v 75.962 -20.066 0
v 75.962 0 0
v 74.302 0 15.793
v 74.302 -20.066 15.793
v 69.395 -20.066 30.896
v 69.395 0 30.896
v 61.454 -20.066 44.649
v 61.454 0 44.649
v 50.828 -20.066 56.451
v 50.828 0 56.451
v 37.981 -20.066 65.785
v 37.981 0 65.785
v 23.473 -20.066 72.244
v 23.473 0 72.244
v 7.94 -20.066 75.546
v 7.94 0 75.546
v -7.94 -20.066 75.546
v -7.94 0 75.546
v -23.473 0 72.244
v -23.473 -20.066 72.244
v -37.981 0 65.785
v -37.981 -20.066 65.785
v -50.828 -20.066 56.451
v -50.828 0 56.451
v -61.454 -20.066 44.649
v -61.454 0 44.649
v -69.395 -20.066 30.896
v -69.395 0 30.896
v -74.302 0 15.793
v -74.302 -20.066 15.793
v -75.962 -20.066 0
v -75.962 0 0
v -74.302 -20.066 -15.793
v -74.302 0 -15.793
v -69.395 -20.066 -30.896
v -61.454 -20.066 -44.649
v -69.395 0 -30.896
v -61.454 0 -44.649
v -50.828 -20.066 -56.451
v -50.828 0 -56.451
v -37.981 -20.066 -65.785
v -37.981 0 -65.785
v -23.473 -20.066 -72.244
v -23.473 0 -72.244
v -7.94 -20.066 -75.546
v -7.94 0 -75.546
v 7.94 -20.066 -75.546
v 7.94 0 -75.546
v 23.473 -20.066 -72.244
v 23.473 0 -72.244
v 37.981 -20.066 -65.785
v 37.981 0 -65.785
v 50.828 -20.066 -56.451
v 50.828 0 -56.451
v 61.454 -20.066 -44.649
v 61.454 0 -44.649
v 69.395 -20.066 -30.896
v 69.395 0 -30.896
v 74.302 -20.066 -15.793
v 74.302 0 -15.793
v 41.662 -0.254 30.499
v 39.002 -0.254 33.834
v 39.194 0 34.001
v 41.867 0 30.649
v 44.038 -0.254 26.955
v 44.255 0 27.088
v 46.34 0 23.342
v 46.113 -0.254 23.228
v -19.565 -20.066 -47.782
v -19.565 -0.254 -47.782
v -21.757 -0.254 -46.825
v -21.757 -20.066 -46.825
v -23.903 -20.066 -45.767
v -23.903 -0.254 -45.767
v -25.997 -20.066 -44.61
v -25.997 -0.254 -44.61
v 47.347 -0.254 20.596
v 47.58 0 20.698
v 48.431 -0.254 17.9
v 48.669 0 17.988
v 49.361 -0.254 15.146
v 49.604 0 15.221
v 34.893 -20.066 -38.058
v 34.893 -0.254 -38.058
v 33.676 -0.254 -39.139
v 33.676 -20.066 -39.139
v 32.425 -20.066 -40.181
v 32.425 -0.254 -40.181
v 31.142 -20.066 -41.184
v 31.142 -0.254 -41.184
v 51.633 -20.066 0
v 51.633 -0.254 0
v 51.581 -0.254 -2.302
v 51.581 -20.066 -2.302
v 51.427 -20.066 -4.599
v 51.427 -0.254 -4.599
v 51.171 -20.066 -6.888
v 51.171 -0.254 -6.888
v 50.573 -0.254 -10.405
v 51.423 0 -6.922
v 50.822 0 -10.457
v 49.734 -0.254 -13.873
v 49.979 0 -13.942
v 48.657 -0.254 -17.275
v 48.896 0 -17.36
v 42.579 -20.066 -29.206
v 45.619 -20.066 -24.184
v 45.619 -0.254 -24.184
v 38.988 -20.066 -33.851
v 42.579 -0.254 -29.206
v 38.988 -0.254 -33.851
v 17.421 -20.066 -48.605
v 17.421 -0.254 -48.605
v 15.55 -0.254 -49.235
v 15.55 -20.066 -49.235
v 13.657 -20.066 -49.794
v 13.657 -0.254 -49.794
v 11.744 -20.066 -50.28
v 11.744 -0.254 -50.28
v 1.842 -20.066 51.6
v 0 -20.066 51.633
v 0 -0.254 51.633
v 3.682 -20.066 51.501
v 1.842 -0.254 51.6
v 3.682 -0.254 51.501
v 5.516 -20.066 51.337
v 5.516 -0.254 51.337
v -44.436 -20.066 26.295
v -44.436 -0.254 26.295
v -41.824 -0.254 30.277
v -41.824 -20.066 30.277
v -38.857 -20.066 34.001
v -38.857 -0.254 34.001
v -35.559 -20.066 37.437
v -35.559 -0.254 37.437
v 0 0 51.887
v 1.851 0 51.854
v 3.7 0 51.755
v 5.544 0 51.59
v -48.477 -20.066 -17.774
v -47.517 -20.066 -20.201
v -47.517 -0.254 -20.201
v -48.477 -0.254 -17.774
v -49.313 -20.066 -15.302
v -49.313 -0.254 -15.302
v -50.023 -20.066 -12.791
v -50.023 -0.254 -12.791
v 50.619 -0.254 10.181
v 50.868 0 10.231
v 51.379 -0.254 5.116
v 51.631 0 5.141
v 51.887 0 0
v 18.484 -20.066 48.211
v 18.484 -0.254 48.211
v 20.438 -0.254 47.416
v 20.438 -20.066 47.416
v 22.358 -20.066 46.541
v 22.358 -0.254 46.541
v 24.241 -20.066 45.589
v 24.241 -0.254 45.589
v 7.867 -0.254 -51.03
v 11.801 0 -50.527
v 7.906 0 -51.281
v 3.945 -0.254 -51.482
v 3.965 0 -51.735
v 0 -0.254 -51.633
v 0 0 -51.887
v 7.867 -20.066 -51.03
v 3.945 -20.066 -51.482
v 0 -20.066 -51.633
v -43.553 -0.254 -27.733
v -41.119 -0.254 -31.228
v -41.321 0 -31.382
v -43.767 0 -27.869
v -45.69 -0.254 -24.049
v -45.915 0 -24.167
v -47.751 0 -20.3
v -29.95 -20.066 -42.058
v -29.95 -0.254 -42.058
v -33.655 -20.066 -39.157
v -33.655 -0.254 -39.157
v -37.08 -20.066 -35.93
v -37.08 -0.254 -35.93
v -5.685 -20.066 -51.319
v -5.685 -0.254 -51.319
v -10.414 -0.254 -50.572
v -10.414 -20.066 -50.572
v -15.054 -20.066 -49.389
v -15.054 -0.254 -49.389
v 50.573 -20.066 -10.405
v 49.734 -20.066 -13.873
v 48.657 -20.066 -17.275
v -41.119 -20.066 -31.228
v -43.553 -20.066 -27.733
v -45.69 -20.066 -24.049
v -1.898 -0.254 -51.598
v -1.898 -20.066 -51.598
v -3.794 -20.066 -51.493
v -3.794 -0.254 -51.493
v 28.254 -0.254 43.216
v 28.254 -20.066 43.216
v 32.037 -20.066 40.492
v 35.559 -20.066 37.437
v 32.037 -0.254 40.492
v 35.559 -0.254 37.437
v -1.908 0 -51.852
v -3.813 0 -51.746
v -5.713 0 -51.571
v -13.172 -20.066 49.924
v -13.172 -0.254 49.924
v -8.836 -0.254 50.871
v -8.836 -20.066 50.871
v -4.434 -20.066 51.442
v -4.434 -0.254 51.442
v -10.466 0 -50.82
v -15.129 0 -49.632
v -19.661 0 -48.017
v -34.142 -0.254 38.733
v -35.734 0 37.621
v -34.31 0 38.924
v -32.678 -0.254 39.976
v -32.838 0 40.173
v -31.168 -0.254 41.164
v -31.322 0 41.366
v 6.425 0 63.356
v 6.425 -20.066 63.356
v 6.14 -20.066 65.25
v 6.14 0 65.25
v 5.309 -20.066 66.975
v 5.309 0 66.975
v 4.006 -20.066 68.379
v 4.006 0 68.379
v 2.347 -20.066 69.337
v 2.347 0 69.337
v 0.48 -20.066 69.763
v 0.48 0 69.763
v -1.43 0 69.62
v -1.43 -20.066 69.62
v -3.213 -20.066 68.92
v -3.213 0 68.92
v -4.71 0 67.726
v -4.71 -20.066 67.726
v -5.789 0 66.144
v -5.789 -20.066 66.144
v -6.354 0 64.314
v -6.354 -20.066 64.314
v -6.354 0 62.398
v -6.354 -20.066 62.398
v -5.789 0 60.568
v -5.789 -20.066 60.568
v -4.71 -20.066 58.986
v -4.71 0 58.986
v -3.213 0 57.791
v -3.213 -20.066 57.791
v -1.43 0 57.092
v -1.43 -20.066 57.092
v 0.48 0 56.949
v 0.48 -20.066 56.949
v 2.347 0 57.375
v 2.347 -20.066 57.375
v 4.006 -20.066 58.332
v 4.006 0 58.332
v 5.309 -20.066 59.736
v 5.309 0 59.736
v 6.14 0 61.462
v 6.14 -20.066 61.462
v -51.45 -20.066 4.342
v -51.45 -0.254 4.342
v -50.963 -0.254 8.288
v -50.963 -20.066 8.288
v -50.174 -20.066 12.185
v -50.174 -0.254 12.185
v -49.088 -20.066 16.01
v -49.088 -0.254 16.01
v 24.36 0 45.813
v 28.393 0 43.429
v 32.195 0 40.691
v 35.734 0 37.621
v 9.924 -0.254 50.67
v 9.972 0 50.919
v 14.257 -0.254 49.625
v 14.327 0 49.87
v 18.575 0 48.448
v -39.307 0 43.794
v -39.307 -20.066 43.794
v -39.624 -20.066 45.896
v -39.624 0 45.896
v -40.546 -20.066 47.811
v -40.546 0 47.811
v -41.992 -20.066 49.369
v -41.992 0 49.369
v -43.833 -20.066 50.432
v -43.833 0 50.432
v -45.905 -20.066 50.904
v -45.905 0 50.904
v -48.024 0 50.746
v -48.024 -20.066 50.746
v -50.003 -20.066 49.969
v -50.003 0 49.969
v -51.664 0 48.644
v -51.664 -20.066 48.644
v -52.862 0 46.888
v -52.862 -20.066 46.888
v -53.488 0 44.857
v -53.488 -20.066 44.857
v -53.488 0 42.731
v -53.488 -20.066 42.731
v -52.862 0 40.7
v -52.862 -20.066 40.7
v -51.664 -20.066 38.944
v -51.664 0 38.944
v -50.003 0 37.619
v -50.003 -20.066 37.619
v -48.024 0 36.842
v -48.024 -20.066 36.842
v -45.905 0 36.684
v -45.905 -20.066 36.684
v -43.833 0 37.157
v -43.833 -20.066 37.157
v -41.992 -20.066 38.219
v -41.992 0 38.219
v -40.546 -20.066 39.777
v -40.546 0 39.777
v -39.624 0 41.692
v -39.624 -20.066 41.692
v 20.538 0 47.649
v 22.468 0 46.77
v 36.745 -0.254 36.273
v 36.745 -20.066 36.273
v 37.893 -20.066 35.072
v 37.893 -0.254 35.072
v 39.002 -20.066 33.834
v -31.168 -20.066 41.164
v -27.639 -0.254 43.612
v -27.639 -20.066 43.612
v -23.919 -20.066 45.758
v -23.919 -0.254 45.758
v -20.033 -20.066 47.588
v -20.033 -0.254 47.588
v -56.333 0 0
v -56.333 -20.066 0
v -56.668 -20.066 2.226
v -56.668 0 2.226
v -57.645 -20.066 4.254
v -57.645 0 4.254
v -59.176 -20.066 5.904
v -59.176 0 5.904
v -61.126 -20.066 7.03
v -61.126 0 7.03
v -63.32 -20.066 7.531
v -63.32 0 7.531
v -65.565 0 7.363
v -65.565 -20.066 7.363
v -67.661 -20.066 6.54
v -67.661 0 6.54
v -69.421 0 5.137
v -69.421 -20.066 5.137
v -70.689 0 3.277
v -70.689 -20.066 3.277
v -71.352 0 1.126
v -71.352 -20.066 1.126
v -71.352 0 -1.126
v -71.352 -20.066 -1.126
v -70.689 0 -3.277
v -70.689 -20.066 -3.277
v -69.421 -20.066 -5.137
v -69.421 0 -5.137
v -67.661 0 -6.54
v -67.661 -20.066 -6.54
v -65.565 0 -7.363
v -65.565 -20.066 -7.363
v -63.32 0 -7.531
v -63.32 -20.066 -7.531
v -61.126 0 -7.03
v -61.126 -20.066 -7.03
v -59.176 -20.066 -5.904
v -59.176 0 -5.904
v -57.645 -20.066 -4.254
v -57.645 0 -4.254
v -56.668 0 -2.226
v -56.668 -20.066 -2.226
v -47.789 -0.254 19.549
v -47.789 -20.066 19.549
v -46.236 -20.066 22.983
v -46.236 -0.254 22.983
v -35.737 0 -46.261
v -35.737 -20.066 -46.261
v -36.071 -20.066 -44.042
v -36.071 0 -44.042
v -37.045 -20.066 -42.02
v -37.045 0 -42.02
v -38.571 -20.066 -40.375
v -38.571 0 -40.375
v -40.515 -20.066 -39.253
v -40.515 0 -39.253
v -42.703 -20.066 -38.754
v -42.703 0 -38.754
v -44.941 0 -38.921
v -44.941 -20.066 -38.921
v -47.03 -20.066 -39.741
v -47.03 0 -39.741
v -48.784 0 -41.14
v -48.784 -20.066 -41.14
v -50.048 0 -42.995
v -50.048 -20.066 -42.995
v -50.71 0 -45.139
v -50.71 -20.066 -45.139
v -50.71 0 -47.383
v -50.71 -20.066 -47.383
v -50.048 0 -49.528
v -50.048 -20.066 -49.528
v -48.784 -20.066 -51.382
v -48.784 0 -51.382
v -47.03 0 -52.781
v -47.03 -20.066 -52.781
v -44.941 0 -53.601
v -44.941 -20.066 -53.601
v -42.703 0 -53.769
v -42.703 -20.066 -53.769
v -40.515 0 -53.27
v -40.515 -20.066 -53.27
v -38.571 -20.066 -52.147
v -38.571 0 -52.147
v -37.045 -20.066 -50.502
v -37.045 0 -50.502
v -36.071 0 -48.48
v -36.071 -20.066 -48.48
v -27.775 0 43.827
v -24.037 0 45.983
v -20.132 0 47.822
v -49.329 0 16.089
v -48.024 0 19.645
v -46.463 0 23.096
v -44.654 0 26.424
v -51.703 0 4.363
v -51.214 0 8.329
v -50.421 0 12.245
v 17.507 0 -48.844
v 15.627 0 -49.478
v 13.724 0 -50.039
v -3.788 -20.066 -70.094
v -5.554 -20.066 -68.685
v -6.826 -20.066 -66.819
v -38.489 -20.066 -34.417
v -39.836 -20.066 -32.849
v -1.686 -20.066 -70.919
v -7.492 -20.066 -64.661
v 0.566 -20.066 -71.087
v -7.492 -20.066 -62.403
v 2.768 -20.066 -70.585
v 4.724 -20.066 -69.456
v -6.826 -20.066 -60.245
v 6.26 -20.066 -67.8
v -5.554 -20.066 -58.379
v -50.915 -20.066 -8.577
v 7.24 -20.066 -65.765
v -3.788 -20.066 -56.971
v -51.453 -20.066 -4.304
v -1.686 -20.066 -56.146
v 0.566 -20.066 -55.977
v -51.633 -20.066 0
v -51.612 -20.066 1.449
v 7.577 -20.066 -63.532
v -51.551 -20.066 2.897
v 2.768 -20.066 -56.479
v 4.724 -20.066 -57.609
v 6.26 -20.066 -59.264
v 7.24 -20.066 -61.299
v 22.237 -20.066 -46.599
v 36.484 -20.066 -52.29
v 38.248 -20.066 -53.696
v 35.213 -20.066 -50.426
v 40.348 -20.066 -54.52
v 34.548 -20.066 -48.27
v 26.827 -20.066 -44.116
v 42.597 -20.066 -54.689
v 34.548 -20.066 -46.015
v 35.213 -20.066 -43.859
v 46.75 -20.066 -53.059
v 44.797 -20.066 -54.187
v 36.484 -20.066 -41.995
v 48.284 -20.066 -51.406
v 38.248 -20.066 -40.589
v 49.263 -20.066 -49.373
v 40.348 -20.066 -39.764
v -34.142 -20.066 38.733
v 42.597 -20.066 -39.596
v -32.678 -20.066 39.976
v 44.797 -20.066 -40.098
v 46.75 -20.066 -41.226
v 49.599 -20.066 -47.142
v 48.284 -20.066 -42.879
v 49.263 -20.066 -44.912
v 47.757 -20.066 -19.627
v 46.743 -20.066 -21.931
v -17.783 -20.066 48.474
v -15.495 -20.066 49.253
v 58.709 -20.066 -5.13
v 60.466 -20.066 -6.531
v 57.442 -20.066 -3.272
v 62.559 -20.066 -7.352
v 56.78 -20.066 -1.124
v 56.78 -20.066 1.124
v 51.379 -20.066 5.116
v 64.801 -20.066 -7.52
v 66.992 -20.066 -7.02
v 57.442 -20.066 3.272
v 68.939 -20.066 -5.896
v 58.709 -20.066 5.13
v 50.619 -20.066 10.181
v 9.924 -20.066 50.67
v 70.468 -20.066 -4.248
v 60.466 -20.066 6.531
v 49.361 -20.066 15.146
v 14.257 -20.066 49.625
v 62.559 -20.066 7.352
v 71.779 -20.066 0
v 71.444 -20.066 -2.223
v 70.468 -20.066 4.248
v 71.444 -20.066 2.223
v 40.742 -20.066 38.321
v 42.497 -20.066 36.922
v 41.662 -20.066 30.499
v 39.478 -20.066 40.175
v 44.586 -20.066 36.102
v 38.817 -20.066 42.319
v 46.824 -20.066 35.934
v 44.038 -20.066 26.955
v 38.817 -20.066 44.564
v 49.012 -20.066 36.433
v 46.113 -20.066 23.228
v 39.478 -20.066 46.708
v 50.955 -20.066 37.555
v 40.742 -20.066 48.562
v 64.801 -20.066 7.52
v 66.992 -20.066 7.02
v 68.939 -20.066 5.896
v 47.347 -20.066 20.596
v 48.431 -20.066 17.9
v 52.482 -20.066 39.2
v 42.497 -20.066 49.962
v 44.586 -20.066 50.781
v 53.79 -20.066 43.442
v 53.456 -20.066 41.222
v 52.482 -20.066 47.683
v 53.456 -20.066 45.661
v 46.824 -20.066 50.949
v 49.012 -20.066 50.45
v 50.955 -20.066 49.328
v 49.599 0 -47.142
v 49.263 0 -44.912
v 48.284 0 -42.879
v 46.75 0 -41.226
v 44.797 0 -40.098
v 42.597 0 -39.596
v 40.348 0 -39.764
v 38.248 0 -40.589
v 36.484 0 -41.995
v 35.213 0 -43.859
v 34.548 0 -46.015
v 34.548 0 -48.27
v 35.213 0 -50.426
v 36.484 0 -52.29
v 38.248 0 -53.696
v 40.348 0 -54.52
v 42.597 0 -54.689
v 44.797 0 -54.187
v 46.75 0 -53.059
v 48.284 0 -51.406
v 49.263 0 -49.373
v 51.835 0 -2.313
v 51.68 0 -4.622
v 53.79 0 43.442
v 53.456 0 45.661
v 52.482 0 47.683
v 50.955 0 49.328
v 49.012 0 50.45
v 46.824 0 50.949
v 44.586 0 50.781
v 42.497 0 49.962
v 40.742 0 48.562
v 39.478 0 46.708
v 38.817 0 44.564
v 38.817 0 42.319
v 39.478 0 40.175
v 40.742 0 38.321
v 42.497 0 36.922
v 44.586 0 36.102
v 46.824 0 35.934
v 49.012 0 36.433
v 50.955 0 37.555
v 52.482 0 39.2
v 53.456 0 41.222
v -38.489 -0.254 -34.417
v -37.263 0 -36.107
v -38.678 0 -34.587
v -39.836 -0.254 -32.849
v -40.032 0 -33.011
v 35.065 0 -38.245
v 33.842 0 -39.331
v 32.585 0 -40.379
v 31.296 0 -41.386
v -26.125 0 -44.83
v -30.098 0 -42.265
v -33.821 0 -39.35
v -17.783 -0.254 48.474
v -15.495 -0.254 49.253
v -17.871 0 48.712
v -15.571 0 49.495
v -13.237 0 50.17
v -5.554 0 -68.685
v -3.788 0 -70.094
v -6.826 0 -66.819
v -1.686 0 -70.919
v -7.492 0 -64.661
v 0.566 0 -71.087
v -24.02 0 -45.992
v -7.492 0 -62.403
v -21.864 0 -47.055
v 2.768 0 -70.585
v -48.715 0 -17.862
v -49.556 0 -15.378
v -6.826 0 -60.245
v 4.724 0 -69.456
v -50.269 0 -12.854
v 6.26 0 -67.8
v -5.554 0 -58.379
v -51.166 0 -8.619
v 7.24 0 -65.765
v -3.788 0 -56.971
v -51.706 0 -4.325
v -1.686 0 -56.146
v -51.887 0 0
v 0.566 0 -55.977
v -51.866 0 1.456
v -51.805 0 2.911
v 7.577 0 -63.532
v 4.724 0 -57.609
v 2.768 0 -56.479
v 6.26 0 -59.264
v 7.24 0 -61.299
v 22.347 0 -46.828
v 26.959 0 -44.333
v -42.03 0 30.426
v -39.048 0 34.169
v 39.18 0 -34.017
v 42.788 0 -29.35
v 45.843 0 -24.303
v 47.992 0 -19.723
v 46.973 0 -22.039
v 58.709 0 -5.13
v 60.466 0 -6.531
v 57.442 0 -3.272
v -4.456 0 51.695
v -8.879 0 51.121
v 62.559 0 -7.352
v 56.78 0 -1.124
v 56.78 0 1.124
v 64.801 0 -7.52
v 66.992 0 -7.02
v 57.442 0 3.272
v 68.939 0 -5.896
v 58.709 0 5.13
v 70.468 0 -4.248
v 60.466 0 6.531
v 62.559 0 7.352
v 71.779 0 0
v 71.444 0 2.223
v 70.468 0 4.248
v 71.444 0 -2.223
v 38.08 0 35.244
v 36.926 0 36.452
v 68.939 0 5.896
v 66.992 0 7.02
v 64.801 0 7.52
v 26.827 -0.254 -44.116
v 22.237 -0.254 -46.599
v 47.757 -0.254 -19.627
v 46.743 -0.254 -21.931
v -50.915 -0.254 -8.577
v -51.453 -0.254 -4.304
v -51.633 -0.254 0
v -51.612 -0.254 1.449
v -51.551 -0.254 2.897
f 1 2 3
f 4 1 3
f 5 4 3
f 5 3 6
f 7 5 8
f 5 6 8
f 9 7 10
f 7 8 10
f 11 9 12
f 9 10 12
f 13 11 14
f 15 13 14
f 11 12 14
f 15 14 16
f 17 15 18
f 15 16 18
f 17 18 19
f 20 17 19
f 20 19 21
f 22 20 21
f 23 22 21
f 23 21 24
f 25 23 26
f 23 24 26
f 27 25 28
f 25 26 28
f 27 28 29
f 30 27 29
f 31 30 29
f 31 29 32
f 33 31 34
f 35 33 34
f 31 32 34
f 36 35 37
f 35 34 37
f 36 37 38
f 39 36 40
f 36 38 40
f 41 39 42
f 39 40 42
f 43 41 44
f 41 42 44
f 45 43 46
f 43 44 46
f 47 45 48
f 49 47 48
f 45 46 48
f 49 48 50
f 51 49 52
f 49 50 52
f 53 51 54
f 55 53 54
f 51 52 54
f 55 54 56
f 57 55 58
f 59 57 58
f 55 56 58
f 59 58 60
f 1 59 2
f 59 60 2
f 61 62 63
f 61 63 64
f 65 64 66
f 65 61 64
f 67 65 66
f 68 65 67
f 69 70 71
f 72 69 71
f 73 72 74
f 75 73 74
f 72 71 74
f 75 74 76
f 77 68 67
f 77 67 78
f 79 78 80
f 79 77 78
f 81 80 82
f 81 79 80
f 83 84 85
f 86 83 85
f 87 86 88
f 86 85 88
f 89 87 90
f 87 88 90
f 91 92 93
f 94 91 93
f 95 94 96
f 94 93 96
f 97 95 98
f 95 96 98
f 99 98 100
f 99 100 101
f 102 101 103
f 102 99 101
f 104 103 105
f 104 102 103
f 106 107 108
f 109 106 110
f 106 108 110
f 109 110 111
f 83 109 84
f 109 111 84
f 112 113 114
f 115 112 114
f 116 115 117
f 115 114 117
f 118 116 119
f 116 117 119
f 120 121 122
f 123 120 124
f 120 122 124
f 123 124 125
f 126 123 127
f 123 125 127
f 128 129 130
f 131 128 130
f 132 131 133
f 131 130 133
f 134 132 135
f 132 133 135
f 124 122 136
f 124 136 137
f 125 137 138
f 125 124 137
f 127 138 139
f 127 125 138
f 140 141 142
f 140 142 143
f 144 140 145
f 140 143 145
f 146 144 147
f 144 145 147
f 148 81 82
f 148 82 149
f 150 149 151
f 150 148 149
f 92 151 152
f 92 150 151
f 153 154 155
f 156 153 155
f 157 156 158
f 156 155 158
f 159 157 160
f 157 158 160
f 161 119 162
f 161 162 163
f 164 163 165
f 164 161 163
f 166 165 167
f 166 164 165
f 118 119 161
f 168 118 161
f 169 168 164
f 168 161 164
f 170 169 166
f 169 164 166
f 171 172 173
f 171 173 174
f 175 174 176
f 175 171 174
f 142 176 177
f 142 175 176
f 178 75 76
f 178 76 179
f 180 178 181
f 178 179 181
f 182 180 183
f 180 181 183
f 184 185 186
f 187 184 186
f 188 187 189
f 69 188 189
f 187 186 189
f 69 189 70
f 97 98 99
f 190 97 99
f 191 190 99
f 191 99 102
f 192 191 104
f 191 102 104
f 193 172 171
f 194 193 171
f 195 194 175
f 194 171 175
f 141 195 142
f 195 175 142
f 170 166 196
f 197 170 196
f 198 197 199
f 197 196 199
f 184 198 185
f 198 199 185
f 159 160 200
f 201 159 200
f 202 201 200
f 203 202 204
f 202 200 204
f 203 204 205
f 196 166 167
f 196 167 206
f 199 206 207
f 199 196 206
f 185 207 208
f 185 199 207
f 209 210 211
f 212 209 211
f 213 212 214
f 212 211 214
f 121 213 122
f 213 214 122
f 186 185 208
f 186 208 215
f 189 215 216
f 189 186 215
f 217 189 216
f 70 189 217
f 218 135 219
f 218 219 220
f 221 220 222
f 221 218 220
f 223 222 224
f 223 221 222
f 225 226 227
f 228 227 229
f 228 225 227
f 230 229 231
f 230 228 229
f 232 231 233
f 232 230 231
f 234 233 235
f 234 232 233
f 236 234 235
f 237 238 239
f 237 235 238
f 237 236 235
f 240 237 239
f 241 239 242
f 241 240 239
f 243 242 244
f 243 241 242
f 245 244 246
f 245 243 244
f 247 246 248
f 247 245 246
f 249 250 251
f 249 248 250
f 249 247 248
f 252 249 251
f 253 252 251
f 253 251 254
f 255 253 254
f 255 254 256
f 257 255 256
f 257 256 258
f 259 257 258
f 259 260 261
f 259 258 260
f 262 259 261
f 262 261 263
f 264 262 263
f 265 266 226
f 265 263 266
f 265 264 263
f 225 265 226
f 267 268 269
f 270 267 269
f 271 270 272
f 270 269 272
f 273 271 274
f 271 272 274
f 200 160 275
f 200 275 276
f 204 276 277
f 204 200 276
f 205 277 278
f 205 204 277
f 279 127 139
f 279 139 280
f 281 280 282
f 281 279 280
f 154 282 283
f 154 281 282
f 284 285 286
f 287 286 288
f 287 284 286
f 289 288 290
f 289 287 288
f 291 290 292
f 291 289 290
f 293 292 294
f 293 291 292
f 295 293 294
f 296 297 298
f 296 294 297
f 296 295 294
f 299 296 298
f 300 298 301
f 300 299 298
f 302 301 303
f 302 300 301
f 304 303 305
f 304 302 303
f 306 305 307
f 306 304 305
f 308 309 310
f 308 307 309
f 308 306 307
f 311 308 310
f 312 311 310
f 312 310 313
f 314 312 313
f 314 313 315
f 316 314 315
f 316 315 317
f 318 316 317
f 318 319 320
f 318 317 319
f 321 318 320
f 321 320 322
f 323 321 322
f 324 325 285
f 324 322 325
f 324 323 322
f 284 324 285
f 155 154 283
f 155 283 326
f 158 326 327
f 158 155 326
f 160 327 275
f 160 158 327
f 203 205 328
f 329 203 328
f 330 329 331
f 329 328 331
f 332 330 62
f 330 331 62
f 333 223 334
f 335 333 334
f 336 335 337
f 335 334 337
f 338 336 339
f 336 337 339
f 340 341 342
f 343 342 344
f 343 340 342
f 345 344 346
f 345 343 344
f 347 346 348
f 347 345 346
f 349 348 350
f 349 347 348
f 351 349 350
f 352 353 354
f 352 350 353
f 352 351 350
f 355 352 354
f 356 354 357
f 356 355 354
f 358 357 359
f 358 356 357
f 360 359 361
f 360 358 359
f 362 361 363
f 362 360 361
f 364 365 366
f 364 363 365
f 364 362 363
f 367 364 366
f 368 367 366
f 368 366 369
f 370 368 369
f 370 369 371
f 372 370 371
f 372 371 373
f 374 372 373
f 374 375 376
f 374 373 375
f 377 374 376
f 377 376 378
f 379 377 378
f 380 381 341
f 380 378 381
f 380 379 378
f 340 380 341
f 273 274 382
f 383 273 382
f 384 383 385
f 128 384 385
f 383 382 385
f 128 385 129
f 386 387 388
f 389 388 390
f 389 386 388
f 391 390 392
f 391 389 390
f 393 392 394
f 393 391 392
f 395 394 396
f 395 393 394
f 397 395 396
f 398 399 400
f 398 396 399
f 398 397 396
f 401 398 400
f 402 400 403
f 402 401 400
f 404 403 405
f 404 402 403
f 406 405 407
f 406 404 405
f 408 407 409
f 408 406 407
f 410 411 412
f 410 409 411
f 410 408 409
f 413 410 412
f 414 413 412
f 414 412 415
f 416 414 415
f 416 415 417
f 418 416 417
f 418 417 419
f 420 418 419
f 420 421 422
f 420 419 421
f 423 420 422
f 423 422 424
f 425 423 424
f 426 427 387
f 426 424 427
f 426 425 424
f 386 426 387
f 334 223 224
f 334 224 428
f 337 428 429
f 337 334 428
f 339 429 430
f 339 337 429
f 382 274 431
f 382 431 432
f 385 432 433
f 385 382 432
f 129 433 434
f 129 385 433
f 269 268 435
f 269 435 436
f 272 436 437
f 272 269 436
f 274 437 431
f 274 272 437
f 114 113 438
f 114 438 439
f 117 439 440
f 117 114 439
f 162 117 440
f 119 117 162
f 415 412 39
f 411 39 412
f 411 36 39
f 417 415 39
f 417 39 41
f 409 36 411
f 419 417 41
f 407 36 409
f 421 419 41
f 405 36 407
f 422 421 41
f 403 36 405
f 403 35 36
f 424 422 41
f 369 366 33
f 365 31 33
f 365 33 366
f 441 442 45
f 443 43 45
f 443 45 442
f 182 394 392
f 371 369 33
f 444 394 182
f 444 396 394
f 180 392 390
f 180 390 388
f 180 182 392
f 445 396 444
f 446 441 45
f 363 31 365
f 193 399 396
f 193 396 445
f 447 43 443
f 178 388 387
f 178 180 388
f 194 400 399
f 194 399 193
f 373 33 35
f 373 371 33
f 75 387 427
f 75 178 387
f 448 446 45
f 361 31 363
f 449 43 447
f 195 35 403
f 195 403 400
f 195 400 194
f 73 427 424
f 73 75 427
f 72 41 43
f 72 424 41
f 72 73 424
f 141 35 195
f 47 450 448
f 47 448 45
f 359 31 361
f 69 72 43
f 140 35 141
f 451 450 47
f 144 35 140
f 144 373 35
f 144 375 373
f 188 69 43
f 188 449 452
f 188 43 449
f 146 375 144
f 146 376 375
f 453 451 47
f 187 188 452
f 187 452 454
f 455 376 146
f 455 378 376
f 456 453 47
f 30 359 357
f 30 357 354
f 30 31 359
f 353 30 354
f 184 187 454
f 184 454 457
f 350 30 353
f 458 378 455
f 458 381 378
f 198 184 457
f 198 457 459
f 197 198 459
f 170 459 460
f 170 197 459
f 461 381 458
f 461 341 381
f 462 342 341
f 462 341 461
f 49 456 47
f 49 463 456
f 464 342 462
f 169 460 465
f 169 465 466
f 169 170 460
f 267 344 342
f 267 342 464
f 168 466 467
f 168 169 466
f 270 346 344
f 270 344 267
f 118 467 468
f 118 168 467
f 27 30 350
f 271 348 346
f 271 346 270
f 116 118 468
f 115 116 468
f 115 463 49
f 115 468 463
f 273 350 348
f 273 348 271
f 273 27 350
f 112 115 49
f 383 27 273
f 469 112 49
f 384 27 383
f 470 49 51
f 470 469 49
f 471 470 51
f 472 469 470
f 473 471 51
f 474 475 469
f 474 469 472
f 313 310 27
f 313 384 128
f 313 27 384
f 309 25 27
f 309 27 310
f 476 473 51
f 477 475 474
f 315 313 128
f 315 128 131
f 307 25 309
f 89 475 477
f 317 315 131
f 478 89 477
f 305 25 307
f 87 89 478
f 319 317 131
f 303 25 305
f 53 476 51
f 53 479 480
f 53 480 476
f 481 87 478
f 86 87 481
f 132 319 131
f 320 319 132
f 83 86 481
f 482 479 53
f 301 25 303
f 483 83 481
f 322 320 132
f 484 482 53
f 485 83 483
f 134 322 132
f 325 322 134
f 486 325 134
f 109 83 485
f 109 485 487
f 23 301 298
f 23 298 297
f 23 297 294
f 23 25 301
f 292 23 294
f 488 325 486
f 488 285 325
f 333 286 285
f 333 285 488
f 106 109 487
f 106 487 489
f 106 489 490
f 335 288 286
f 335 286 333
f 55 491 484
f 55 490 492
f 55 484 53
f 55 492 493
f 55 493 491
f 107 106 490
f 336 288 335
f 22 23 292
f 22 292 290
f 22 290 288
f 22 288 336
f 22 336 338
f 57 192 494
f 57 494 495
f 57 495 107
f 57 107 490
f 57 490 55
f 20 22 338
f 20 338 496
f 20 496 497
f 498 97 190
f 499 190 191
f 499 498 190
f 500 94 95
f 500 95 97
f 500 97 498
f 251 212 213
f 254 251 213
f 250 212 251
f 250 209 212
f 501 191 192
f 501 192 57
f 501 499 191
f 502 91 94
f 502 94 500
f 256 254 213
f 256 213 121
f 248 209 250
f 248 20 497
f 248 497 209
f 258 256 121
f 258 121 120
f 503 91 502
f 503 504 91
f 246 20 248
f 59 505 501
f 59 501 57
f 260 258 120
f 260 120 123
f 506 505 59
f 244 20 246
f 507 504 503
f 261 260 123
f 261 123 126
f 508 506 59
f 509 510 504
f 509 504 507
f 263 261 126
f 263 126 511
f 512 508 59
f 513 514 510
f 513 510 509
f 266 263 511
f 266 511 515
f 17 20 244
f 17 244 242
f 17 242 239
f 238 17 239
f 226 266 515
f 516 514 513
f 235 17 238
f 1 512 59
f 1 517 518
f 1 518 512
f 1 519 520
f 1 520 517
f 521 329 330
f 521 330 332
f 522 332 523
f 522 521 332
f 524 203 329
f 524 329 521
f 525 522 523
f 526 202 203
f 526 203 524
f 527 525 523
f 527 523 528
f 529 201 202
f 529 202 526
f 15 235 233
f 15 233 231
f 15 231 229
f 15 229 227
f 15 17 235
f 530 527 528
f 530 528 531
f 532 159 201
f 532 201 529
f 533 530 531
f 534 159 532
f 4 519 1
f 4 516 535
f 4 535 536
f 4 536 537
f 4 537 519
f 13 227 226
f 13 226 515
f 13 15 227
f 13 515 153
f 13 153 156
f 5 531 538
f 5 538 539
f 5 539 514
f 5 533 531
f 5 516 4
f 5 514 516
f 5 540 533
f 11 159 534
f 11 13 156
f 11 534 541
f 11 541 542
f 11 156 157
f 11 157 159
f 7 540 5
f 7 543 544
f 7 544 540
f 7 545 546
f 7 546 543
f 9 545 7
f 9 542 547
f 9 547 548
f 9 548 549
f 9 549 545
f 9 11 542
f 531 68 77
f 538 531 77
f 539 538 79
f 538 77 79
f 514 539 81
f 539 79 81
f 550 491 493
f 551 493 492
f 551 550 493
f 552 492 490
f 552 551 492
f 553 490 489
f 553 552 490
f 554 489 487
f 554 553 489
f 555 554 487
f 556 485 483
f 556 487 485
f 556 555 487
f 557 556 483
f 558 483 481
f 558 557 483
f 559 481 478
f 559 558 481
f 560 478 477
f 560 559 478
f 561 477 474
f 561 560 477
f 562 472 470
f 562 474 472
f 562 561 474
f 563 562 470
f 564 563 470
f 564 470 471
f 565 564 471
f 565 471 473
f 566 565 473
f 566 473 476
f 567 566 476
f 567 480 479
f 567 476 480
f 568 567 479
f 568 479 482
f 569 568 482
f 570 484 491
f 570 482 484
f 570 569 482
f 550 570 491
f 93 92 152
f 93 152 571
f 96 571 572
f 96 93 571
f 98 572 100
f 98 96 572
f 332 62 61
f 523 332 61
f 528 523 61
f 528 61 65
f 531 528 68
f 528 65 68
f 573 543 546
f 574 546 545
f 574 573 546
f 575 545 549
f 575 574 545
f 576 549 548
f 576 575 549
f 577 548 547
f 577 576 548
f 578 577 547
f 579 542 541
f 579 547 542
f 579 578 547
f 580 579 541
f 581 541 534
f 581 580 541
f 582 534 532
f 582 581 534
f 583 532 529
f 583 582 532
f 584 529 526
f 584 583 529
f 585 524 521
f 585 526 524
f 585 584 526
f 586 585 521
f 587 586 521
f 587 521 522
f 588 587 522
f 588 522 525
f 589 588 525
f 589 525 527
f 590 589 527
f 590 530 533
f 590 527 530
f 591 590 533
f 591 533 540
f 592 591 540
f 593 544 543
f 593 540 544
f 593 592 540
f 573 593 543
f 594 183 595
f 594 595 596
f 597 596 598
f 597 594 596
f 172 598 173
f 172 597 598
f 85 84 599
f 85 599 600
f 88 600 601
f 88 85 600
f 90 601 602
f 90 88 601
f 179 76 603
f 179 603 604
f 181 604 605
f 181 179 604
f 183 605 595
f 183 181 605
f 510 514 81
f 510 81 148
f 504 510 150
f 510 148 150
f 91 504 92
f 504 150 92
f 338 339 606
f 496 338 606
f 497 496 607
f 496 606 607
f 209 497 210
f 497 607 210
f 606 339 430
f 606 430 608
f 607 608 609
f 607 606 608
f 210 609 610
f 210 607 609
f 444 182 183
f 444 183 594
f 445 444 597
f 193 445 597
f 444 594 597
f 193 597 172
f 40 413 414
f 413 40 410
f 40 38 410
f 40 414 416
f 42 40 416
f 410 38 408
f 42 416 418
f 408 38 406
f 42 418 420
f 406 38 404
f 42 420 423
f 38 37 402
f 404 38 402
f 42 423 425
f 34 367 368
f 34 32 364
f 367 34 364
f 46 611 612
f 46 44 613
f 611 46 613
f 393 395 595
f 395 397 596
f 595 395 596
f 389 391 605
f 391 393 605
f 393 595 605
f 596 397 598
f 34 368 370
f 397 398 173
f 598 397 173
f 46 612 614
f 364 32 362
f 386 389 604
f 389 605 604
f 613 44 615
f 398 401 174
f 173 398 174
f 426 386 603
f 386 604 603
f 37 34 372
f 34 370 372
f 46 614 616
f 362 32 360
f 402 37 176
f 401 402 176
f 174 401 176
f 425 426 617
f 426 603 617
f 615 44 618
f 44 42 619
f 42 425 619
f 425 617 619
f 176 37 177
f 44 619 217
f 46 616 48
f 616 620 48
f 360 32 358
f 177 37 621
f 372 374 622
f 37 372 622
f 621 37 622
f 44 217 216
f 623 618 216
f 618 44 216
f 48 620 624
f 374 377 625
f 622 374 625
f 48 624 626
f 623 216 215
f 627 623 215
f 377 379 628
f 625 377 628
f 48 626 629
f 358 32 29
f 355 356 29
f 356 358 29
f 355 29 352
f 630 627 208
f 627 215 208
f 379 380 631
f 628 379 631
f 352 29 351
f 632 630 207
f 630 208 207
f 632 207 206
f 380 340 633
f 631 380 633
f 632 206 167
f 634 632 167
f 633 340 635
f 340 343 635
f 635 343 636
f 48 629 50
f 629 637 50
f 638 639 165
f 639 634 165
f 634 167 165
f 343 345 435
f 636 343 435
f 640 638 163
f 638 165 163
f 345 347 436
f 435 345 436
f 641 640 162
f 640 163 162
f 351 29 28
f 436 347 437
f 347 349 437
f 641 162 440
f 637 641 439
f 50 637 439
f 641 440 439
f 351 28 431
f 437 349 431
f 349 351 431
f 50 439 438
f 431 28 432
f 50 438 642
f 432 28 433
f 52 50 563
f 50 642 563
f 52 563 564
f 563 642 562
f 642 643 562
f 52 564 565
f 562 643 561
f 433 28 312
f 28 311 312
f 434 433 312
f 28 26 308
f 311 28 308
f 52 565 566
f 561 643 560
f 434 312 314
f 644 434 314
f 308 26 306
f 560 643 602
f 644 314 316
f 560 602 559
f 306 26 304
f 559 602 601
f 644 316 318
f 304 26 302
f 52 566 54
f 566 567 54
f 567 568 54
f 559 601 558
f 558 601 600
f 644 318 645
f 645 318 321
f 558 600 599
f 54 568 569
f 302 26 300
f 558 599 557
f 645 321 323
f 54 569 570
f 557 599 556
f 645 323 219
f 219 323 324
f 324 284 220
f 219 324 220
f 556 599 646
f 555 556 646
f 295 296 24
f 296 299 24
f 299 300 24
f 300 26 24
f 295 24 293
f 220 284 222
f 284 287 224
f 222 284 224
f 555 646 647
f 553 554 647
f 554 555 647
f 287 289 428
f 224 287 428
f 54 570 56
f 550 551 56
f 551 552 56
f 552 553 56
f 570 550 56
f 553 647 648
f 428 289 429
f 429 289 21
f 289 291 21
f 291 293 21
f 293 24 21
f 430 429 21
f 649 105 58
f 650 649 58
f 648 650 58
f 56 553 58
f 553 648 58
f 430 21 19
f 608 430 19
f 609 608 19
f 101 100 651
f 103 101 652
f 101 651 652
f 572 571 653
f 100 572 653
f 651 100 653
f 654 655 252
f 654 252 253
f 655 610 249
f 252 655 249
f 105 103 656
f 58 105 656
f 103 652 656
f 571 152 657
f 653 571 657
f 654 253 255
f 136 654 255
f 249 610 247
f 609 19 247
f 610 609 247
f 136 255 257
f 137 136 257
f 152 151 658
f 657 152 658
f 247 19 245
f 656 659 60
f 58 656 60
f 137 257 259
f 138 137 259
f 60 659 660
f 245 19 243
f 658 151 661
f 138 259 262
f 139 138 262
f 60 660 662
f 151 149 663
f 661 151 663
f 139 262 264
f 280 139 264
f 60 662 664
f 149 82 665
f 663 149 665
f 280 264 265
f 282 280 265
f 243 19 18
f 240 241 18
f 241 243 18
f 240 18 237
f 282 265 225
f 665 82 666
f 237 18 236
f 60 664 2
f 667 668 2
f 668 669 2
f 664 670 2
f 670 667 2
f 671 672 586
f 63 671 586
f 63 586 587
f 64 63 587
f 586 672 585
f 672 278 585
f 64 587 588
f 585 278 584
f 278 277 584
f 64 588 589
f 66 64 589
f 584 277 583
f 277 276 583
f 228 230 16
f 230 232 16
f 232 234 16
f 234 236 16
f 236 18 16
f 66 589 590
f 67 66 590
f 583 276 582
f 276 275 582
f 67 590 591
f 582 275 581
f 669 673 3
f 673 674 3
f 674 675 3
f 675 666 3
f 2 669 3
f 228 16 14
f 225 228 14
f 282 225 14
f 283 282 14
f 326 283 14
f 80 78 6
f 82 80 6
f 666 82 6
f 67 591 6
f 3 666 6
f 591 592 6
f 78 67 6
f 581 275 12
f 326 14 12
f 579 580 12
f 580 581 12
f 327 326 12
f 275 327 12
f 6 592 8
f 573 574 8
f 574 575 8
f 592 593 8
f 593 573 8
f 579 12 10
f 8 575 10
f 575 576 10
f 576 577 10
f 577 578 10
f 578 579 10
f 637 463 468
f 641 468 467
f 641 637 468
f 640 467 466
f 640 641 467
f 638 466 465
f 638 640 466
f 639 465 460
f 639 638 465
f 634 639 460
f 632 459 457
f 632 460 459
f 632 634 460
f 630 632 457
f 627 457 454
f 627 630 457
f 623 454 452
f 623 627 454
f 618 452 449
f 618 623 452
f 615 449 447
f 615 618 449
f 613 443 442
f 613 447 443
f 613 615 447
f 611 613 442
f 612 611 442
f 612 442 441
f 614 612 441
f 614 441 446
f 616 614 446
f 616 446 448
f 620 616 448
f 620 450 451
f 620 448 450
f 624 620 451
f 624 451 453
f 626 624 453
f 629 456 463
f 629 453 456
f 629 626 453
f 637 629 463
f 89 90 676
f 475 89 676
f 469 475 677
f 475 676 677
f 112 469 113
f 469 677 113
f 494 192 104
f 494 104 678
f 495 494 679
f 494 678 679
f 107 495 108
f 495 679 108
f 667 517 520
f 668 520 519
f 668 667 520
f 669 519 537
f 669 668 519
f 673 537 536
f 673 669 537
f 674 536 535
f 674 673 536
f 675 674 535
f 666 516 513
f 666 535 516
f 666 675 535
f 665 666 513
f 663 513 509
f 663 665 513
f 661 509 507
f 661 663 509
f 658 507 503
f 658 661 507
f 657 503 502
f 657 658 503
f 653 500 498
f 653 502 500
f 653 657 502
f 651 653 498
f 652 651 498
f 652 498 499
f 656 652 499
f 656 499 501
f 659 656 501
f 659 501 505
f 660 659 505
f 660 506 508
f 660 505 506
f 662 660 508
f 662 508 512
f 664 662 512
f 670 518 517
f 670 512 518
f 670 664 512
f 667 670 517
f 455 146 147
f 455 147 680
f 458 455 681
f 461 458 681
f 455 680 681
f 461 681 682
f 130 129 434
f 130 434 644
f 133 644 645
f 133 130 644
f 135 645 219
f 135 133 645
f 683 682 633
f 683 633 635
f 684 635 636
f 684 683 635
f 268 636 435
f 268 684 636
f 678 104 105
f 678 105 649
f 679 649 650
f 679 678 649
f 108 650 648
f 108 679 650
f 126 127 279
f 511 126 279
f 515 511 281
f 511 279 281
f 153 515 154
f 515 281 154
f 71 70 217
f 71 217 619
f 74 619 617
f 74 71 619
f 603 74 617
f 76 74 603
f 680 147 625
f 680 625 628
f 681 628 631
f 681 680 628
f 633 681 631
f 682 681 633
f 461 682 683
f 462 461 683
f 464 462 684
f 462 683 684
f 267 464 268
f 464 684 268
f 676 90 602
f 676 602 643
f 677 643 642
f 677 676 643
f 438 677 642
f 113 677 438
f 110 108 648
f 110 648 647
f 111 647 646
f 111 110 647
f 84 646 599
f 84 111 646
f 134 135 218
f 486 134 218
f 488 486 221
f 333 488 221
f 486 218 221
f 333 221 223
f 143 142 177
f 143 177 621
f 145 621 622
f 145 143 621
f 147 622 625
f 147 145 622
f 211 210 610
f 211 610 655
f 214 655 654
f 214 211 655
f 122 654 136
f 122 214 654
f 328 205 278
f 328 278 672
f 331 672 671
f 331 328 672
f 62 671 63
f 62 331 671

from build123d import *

# Parameters (mm, degrees)
F0_R     = 75.961814
F0_R_2   = 59.912774
F1_DEPTH = 20.066
F2_R     = 7.541578
F2_R_2   = 7.528696
F2_R_3   = 6.425278
F2_R_4   = 7.130382
F2_R_5   = 7.551866
F2_R_6   = 7.528699
F2_R_7   = 7.576505
F2_R_8   = 7.567783
F3_DEPTH = 20.067
F4_SIZE  = 0.254


with BuildPart() as f1:
    # F0 (on Front) → F1 (new body)
    with BuildSketch(Plane.XZ):
        Circle(F0_R)
        Circle(F0_R_2, mode=Mode.SUBTRACT)
        Circle(F0_R_2)
        with BuildLine():
            ThreePointArc((49.361188, 15.14638), (51.061693, 7.657884), (51.632738, 0))
            ThreePointArc((51.632738, 0), (51.517245, -3.451544), (51.171281, -6.887647))
            ThreePointArc((51.171281, -6.887647), (50.183668, -12.146567), (48.657094, -17.275036))
            ThreePointArc((48.657094, -17.275036), (47.264303, -20.785219), (45.618675, -24.184213))
            ThreePointArc((45.618675, -24.184213), (40.849348, -31.579588), (34.893463, -38.057665))
            ThreePointArc((34.893463, -38.057665), (33.054915, -39.665), (31.142422, -41.183604))
            ThreePointArc((31.142422, -41.183604), (24.563545, -45.415547), (17.420865, -48.605073))
            ThreePointArc((17.420865, -48.605073), (14.606221, -49.523711), (11.74355, -50.279506))
            ThreePointArc((11.74355, -50.279506), (5.91063, -51.293314), (0, -51.632738))
            ThreePointArc((0, -51.632738), (-2.846774, -51.5542), (-5.684887, -51.318824))
            ThreePointArc((-5.684887, -51.318824), (-12.748176, -50.034225), (-19.565006, -47.782321))
            ThreePointArc((-19.565006, -47.782321), (-22.836173, -46.308194), (-25.997065, -44.61045))
            ThreePointArc((-25.997065, -44.61045), (-31.835901, -40.649908), (-37.080304, -35.930359))
            ThreePointArc((-37.080304, -35.930359), (-39.170155, -33.639837), (-41.118749, -31.228002))
            ThreePointArc((-41.118749, -31.228002), (-44.659518, -25.912682), (-47.516984, -20.200889))
            ThreePointArc((-47.516984, -20.200889), (-48.91063, -16.543575), (-50.023242, -12.791203))
            ThreePointArc((-50.023242, -12.791203), (-51.228784, -6.446033), (-51.632738, 0))
            ThreePointArc((-51.632738, 0), (-51.586992, 2.172995), (-51.449835, 4.342139))
            ThreePointArc((-51.449835, 4.342139), (-50.606227, 10.244482), (-49.087805, 16.010218))
            ThreePointArc((-49.087805, 16.010218), (-47.043655, 21.2799), (-44.435744, 26.294567))
            ThreePointArc((-44.435744, 26.294567), (-40.383346, 32.173359), (-35.558677, 37.436882))
            ThreePointArc((-35.558677, 37.436882), (-33.415529, 39.361683), (-31.168373, 41.163967))
            ThreePointArc((-31.168373, 41.163967), (-25.80143, 44.723884), (-20.033066, 47.587981))
            ThreePointArc((-20.033066, 47.587981), (-16.643542, 48.876704), (-13.171924, 49.924344))
            ThreePointArc((-13.171924, 49.924344), (-6.641125, 51.203858), (0, 51.632738))
            ThreePointArc((0, 51.632738), (2.762171, 51.558802), (5.516431, 51.337205))
            ThreePointArc((5.516431, 51.337205), (12.101384, 50.194583), (18.483581, 48.210962))
            ThreePointArc((18.483581, 48.210962), (21.402325, 46.988085), (24.240673, 45.588698))
            ThreePointArc((24.240673, 45.588698), (30.176209, 41.896731), (35.558677, 37.436882))
            ThreePointArc((35.558677, 37.436882), (37.323996, 35.677149), (39.002331, 33.83427))
            ThreePointArc((39.002331, 33.83427), (42.886907, 28.751571), (46.113144, 23.227518))
            ThreePointArc((46.113144, 23.227518), (47.907861, 19.255557), (49.361188, 15.14638))
        make_face(mode=Mode.SUBTRACT)
    extrude(amount=F1_DEPTH)

    # F2 (on Front) → F3 (cut, through all)
    with BuildSketch(Plane.XZ):
        with Locations((64.237103, 0)):
            Circle(F2_R)
        with Locations((46.261288, 43.441553)):
            Circle(F2_R_2)
        with Locations((0, 63.355938)):
            Circle(F2_R_3)
        with Locations((-46.437524, 43.794021)):
            Circle(F2_R_4)
        with Locations((-63.884638, 0)):
            Circle(F2_R_5)
        with Locations((-43.26532, -46.261288)):
            Circle(F2_R_6)
        with Locations((0, -63.532166)):
            Circle(F2_R_7)
        with Locations((42.031687, -47.142457)):
            Circle(F2_R_8)
    extrude(amount=F3_DEPTH, mode=Mode.SUBTRACT)

    # F4
    f4_edges = [f1.edges().sort_by_distance(p)[0] for p in [
        (-31.142422, 0, 41.183604),
    ]]
    chamfer(f4_edges, length=F4_SIZE)


solid = f1.part
